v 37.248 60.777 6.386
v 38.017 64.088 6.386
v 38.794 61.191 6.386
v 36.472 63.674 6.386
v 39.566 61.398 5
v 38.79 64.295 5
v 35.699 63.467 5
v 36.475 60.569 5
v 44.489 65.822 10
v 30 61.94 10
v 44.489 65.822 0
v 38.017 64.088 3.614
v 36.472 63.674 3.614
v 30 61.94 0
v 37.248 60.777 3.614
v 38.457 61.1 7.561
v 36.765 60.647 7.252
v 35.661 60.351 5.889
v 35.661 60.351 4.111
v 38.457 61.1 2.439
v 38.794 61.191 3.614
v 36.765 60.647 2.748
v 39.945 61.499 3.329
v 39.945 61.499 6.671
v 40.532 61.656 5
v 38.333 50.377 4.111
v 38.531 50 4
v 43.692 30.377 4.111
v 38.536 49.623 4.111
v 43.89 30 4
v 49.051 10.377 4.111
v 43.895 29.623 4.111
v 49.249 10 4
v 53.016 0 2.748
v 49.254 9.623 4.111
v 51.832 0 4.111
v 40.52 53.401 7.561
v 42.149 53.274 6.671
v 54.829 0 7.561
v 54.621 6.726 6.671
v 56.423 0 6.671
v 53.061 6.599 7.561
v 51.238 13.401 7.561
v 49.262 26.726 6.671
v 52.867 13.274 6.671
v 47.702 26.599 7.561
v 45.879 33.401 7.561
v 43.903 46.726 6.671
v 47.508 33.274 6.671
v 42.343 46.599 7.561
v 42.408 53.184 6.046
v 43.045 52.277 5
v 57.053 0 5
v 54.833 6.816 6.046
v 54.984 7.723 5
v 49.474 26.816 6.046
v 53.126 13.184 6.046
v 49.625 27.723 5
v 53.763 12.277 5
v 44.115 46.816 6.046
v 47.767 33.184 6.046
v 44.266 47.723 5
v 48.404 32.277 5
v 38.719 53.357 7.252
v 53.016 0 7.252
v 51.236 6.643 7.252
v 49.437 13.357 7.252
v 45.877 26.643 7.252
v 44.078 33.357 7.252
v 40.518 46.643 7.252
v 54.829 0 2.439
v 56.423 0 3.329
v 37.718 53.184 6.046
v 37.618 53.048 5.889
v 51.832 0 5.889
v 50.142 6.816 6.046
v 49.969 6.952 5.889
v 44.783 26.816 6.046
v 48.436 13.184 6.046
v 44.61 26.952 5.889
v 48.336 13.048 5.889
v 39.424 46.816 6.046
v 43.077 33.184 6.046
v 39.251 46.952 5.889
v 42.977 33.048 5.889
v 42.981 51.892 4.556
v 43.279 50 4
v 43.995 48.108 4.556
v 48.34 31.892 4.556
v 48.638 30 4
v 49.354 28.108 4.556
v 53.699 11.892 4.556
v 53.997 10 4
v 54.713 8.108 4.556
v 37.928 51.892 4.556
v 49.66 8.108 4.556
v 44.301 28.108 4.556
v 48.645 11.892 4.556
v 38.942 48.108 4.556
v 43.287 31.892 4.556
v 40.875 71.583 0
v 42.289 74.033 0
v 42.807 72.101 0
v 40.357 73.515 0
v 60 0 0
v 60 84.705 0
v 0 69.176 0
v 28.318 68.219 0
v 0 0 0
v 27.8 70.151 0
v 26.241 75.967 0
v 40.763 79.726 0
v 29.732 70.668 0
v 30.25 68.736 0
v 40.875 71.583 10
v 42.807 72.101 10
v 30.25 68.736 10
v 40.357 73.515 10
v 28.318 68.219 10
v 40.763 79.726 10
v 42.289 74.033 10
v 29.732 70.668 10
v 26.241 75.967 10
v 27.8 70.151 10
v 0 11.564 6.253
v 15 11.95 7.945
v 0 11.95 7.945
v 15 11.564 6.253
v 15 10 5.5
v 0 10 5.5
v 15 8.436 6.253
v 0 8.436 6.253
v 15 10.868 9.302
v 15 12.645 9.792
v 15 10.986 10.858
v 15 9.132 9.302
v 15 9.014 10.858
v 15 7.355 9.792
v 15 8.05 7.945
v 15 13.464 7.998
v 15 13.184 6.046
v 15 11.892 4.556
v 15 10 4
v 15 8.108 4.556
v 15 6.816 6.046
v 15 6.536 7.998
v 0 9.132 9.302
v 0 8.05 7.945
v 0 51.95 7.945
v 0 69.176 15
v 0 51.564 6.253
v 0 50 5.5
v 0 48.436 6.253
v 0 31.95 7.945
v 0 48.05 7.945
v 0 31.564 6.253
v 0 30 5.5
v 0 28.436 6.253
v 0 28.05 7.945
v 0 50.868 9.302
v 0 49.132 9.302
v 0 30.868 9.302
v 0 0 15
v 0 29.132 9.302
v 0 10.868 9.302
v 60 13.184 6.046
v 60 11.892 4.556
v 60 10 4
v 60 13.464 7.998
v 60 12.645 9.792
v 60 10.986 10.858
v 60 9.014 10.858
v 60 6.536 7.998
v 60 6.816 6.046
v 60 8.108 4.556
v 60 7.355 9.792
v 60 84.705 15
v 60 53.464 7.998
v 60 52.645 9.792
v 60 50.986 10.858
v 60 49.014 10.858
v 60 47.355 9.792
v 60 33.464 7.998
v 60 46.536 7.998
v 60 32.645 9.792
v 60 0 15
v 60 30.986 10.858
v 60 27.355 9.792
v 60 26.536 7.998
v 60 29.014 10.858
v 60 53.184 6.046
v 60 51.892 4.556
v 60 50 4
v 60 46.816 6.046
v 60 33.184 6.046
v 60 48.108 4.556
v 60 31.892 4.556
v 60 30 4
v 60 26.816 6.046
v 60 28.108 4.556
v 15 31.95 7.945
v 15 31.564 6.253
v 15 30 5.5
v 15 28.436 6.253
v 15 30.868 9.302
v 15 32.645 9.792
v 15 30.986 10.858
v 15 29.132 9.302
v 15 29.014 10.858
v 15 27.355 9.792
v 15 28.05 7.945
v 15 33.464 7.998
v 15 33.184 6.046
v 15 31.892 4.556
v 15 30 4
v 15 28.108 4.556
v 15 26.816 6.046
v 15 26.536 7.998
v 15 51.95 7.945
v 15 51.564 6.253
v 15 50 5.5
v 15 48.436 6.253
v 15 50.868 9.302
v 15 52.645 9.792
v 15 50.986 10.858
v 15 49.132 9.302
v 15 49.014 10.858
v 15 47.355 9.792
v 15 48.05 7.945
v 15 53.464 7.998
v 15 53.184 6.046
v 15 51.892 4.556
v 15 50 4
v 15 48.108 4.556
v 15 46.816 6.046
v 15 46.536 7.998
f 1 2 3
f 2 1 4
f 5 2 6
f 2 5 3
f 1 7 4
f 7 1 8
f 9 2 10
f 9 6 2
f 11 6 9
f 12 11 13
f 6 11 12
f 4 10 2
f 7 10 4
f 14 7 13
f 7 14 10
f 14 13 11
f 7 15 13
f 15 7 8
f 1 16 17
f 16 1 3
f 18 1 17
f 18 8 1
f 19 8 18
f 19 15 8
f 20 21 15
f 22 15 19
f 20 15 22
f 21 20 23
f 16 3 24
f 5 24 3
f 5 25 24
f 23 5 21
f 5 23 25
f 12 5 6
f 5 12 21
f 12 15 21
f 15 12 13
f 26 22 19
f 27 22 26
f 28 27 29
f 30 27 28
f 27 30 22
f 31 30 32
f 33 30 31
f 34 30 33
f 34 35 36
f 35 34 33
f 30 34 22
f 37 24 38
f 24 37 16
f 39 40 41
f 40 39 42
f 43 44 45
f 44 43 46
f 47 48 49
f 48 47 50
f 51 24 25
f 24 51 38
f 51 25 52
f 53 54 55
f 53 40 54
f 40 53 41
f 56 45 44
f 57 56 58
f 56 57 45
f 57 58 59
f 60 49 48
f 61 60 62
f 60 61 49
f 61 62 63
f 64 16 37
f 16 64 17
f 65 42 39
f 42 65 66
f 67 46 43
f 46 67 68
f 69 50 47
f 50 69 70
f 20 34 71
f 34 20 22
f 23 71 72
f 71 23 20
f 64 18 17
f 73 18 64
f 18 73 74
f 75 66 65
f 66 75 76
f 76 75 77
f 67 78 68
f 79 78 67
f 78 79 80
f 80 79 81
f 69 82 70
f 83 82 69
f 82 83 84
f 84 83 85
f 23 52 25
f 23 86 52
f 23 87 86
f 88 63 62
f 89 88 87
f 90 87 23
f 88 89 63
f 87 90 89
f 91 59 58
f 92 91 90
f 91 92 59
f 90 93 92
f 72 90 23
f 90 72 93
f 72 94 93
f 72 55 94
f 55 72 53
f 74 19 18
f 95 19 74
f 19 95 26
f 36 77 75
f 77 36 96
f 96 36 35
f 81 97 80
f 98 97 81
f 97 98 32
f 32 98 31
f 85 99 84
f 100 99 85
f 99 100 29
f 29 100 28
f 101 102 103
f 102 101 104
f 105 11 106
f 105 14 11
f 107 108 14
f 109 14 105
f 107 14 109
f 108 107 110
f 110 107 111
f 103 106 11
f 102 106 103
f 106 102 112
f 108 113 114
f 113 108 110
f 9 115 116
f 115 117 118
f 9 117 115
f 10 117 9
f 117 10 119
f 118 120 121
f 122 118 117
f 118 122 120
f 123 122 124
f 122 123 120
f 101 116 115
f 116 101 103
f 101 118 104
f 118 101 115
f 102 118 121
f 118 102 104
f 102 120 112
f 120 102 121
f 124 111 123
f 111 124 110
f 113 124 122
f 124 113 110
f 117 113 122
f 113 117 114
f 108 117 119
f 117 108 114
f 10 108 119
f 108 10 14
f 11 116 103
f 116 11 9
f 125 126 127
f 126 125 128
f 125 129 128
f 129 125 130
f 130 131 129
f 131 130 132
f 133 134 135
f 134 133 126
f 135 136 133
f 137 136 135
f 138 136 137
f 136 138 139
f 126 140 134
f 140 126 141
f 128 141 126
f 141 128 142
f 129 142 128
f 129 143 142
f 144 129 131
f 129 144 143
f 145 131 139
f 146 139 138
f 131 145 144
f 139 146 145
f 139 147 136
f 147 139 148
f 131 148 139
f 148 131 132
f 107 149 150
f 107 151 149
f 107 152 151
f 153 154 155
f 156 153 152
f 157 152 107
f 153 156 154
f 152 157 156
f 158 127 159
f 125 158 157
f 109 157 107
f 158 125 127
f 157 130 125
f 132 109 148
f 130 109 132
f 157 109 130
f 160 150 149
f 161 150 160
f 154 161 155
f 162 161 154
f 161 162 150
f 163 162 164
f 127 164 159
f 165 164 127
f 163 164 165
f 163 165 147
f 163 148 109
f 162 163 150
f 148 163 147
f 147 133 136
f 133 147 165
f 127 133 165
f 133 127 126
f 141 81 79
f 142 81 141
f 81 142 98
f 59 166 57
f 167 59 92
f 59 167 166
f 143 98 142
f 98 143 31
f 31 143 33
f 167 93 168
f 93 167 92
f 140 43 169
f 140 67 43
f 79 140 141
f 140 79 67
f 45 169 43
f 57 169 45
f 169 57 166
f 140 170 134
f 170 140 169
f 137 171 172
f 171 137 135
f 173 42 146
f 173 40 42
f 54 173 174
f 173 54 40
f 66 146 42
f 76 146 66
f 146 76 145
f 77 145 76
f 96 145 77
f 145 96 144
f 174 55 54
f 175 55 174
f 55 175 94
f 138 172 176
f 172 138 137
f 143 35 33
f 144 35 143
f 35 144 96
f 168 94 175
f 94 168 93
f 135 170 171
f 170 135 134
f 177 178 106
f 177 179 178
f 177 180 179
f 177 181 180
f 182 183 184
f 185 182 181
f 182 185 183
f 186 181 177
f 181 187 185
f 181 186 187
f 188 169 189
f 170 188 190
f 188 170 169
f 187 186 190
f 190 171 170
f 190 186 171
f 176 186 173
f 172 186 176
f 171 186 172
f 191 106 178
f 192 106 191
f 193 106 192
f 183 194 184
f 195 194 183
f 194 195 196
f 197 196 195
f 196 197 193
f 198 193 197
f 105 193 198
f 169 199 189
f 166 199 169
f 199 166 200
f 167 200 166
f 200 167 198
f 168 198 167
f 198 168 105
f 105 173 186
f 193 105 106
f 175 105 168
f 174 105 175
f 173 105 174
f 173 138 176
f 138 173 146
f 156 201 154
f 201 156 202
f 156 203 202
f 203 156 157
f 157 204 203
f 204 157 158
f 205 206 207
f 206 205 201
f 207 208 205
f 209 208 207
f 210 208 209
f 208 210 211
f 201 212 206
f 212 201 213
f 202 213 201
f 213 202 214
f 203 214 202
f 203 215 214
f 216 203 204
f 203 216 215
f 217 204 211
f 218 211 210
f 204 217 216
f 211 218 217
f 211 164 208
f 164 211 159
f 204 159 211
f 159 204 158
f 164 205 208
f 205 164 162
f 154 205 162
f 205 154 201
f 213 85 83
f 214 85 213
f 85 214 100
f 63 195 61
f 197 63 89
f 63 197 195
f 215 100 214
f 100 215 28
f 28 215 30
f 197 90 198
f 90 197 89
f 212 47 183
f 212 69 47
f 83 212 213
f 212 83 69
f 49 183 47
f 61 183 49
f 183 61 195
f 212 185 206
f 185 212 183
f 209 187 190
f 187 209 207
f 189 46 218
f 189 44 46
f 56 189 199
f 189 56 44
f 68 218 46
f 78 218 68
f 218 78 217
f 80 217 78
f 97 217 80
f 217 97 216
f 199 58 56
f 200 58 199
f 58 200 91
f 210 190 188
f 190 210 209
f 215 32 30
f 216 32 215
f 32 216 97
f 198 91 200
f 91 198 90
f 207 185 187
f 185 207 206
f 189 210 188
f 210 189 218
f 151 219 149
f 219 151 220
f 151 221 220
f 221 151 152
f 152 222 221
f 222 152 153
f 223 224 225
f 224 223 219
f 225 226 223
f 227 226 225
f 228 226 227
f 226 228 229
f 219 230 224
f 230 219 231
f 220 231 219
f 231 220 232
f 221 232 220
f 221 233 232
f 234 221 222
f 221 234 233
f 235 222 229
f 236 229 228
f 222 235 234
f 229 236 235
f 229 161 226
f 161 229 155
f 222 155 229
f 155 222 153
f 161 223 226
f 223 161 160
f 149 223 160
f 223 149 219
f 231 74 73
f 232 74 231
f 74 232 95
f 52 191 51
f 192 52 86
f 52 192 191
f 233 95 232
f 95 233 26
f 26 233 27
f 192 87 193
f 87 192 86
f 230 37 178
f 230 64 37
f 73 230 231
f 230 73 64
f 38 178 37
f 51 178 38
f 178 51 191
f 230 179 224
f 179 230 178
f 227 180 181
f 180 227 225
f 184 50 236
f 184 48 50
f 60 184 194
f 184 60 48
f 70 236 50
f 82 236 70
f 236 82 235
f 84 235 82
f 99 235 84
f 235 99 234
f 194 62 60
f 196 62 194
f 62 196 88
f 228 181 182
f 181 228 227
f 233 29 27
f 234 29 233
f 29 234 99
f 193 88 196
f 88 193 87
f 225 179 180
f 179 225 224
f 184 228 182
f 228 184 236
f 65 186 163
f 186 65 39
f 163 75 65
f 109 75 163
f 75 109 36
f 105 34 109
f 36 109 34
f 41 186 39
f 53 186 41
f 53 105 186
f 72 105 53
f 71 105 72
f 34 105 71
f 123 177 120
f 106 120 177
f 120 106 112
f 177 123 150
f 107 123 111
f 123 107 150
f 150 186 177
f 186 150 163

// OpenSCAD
beam_size=15;
beam_row_size=2;
beam_row_start=(beam_size-beam_row_size)/2;
beam_row_end=beam_row_start + beam_row_size;

module makerbeam() {
polygon(points=[[0,0],[0,beam_row_start],[beam_row_size,beam_row_start],[beam_row_size,beam_row_end],[0,beam_row_end],[0,beam_size],[beam_size,beam_size],[beam_size,beam_row_end],[beam_size- beam_row_size,beam_row_end],[beam_size- beam_row_size,beam_row_start],[beam_size,beam_row_start],[beam_size,0]]);
}


module cutter(size) {
    translate([-size,-size]) {
        difference() { 
            square([size*2,size*2]);
            translate([size*2,0]) {
                circle(r=size);
            }
        }
    }
}

module makerbeam_inlet(with_hole = false) {
    linear_extrude(10) {
        makerbeam();
    }
    if (with_hole) {
        rotate([90,0,0]) {
            translate([beam_size/2,10/2,0]) {
                cylinder(d=3.2, h=3);
            }
            translate([beam_size/2,10/2,3]) {
                cylinder(d=5.2, h=100);
            }
        }
    }
}

module side() {
    difference() {
        linear_extrude(15) {
            difference([0,15]) {
                    polygon(points=[
                        [0,0],
                        [0,20],
                        [190,20+190*sin(15)],
                        [190,0]
                    ]);
                translate([0,21.5]) {
                    cutter(5);
                }
            }
        }
        
        //beam 1
        translate([10,5+10*sin(15),0]) {
            rotate([0,0,15]) {
                makerbeam_inlet(with_hole=true);
            }
        }
        
        //beam 2
        translate([100,5+100*sin(15),0]) {
            rotate([0,0,15]) {
                makerbeam_inlet(with_hole=true);
            }
        }

        //beam 3
        translate([160,5+160*sin(15),0]) {
            rotate([0,0,15]) {
                makerbeam_inlet();
            }
        }
        
        //back hole 1
        translate([175,10,15/2]) {
            rotate([0,90,0]) {
                cylinder(d=4,h=15);
            }
        }
        
        //back hole 2
        translate([175,50,15/2]) {
            rotate([0,90,0]) {
                cylinder(d=4,h=15);
            }
        }

        //back hole 3
        translate([175,30,15/2]) {
            rotate([0,90,0]) {
                cylinder(d=4,h=15);
            }
        }
    }
}

module screw() {
    translate([0,0,2]) {
        cylinder(d=17, h=4, center=true);
    }
    translate([0,0,6]) {
        cube([7,7,7], center=true);
    }

    translate([0,0,13]) {
        cylinder(d=6, h=9, center=true);
    }
}
        
       
module back() {
    difference() {
        linear_extrude(15) {
            polygon(points=[
                [0,0],
                [0,20+190*sin(15)],
                [60,20+250*sin(15)],
                [60,0]
            ]);
            
        }
        

        
        translate([30,5+220*sin(15),0]) {
            rotate([0,0,15]) {
                makerbeam_inlet(with_hole=true);
            }
        }

        
        //back hole 1
        translate([0,10,15/2]) {
            rotate([0,90,0]) {
                cylinder(d=4,h=15);
                translate([0,0,15]) {
                    cylinder(d=7,h=45);
                }
            }
        }
        
        //back hole 2
        translate([0,30,15/2]) {
            rotate([0,90,0]) {
                cylinder(d=4,h=15);
                translate([0,0,15]) {
                    cylinder(d=7,h=45);
                }
            }
        }
        
        
        //back hole 3
        translate([0,50,15/2]) {
            rotate([0,90,0]) {
                cylinder(d=4,h=15);
                translate([0,0,15]) {
                    cylinder(d=7,h=45);
                }
            }
        }
        
    }
}



//side();
back();
